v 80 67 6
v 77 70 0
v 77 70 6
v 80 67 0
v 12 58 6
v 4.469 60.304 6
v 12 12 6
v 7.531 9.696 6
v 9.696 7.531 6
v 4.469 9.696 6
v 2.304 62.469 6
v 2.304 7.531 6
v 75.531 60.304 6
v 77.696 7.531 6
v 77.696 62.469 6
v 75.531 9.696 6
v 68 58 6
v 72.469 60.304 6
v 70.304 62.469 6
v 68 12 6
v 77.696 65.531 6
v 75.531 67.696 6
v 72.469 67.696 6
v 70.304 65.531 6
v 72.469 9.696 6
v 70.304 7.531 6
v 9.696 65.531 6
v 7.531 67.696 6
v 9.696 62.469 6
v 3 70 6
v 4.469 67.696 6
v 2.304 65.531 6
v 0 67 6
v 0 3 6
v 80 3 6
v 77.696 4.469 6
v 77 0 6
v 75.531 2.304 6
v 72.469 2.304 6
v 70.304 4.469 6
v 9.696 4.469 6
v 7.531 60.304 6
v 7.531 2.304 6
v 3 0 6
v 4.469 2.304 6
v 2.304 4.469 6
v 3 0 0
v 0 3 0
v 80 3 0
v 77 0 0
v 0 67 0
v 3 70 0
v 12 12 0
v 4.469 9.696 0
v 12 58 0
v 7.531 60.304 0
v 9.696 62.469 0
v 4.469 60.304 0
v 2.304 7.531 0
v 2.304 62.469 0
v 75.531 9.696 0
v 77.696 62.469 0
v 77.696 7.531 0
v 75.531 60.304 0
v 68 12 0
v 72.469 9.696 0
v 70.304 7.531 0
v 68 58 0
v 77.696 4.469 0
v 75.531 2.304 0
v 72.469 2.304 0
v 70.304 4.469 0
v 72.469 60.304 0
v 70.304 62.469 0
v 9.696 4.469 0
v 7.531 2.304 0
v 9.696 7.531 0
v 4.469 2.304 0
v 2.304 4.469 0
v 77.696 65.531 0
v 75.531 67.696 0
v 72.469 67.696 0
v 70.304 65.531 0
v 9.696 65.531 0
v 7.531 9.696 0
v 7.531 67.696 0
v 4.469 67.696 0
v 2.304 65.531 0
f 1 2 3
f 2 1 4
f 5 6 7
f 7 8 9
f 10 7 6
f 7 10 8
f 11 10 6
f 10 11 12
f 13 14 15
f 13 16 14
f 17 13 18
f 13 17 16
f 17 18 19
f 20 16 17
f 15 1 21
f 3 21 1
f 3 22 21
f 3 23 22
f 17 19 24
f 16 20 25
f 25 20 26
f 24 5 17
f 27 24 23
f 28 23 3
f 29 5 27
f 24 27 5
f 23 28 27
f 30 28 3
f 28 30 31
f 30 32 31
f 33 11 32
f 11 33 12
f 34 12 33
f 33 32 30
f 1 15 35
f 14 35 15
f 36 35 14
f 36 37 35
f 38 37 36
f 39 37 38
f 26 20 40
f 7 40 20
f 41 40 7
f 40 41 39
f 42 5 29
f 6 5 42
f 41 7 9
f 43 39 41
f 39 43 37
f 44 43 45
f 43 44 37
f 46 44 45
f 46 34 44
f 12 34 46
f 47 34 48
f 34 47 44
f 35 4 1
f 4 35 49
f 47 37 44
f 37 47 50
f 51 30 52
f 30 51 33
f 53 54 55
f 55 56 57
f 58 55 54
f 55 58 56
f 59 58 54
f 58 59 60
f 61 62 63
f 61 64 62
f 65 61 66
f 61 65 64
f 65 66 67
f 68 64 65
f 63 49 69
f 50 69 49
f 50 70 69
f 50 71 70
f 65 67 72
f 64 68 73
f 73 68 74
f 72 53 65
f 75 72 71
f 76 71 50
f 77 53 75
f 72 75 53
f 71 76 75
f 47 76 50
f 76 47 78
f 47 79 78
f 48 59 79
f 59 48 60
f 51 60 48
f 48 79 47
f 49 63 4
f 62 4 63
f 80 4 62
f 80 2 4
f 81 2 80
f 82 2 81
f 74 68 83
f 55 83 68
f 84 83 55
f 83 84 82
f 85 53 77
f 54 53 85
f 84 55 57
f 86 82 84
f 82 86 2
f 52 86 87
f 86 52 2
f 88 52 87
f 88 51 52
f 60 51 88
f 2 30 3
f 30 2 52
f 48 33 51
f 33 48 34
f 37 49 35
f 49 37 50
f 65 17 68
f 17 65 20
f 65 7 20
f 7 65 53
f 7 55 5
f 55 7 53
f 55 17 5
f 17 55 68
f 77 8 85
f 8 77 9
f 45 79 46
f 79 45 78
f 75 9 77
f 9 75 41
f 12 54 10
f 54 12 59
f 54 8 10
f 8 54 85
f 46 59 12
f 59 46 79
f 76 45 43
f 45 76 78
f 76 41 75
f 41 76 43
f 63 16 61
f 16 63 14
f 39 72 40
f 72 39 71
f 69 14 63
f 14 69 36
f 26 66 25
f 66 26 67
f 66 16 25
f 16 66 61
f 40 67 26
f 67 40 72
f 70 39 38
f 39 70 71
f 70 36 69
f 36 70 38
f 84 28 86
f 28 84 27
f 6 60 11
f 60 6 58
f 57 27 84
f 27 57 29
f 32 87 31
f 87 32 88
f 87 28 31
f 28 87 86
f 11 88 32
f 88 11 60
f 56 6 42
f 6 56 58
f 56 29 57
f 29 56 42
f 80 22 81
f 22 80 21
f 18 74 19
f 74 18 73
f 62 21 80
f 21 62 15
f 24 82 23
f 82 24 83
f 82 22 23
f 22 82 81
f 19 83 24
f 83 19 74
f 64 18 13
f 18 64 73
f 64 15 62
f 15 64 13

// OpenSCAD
$fn = 32;

// ----------------------------------------------------------------------
// Frame plate: 80 x 70 frame, 12 mm rails
// ----------------------------------------------------------------------

// --- parameters (mm) ---
plate_l = 80;             // plate length, X
plate_w = 70;             // plate width, Y
plate_t = 6;              // plate thickness, Z (extrusion height)
corner_c = 3;             // corner chamfer
frame_bar = 12;           // frame rail width
bolt_r = 4;               // corner bolt window radius
bolt_inset = 6;           // bolt centre inset from the edges
fit_tol = 0.1;            // declared fit tolerance (prompt contract)
free_tol = 0.3;           // declared free tolerance (prompt contract)

win_l = plate_l - 2 * frame_bar;  // window length
win_w = plate_w - 2 * frame_bar;  // window width
bolt_d = 2 * bolt_r;  // corner hole diameter

profile = [[3, 0], [77, 0], [80, 3], [80, 67], [77, 70], [3, 70], [0, 67], [0, 3]];  // primary outline, 8 points, counter clockwise
void_1 = [[12, 12], [68, 12], [68, 58], [12, 58]];  // the window, 4 points
void_2 = [[9.696, 7.531], [7.531, 9.696], [4.469, 9.696], [2.304, 7.531], [2.304, 4.469], [4.469, 2.304], [7.531, 2.304], [9.696, 4.469]];  // corner bolt window, 8 points
void_3 = [[77.696, 7.531], [75.531, 9.696], [72.469, 9.696], [70.304, 7.531], [70.304, 4.469], [72.469, 2.304], [75.531, 2.304], [77.696, 4.469]];  // corner bolt window, 8 points
void_4 = [[9.696, 65.531], [7.531, 67.696], [4.469, 67.696], [2.304, 65.531], [2.304, 62.469], [4.469, 60.304], [7.531, 60.304], [9.696, 62.469]];  // corner bolt window, 8 points
void_5 = [[77.696, 65.531], [75.531, 67.696], [72.469, 67.696], [70.304, 65.531], [70.304, 62.469], [72.469, 60.304], [75.531, 60.304], [77.696, 62.469]];  // corner bolt window, 8 points

// --- the one profile operation ---
difference() {
  linear_extrude(height = plate_t) polygon(points = profile);
  translate([0, 0, -1])
    linear_extrude(height = plate_t + 2) polygon(points = void_1);
  translate([0, 0, -1])
    linear_extrude(height = plate_t + 2) polygon(points = void_2);
  translate([0, 0, -1])
    linear_extrude(height = plate_t + 2) polygon(points = void_3);
  translate([0, 0, -1])
    linear_extrude(height = plate_t + 2) polygon(points = void_4);
  translate([0, 0, -1])
    linear_extrude(height = plate_t + 2) polygon(points = void_5);
}
